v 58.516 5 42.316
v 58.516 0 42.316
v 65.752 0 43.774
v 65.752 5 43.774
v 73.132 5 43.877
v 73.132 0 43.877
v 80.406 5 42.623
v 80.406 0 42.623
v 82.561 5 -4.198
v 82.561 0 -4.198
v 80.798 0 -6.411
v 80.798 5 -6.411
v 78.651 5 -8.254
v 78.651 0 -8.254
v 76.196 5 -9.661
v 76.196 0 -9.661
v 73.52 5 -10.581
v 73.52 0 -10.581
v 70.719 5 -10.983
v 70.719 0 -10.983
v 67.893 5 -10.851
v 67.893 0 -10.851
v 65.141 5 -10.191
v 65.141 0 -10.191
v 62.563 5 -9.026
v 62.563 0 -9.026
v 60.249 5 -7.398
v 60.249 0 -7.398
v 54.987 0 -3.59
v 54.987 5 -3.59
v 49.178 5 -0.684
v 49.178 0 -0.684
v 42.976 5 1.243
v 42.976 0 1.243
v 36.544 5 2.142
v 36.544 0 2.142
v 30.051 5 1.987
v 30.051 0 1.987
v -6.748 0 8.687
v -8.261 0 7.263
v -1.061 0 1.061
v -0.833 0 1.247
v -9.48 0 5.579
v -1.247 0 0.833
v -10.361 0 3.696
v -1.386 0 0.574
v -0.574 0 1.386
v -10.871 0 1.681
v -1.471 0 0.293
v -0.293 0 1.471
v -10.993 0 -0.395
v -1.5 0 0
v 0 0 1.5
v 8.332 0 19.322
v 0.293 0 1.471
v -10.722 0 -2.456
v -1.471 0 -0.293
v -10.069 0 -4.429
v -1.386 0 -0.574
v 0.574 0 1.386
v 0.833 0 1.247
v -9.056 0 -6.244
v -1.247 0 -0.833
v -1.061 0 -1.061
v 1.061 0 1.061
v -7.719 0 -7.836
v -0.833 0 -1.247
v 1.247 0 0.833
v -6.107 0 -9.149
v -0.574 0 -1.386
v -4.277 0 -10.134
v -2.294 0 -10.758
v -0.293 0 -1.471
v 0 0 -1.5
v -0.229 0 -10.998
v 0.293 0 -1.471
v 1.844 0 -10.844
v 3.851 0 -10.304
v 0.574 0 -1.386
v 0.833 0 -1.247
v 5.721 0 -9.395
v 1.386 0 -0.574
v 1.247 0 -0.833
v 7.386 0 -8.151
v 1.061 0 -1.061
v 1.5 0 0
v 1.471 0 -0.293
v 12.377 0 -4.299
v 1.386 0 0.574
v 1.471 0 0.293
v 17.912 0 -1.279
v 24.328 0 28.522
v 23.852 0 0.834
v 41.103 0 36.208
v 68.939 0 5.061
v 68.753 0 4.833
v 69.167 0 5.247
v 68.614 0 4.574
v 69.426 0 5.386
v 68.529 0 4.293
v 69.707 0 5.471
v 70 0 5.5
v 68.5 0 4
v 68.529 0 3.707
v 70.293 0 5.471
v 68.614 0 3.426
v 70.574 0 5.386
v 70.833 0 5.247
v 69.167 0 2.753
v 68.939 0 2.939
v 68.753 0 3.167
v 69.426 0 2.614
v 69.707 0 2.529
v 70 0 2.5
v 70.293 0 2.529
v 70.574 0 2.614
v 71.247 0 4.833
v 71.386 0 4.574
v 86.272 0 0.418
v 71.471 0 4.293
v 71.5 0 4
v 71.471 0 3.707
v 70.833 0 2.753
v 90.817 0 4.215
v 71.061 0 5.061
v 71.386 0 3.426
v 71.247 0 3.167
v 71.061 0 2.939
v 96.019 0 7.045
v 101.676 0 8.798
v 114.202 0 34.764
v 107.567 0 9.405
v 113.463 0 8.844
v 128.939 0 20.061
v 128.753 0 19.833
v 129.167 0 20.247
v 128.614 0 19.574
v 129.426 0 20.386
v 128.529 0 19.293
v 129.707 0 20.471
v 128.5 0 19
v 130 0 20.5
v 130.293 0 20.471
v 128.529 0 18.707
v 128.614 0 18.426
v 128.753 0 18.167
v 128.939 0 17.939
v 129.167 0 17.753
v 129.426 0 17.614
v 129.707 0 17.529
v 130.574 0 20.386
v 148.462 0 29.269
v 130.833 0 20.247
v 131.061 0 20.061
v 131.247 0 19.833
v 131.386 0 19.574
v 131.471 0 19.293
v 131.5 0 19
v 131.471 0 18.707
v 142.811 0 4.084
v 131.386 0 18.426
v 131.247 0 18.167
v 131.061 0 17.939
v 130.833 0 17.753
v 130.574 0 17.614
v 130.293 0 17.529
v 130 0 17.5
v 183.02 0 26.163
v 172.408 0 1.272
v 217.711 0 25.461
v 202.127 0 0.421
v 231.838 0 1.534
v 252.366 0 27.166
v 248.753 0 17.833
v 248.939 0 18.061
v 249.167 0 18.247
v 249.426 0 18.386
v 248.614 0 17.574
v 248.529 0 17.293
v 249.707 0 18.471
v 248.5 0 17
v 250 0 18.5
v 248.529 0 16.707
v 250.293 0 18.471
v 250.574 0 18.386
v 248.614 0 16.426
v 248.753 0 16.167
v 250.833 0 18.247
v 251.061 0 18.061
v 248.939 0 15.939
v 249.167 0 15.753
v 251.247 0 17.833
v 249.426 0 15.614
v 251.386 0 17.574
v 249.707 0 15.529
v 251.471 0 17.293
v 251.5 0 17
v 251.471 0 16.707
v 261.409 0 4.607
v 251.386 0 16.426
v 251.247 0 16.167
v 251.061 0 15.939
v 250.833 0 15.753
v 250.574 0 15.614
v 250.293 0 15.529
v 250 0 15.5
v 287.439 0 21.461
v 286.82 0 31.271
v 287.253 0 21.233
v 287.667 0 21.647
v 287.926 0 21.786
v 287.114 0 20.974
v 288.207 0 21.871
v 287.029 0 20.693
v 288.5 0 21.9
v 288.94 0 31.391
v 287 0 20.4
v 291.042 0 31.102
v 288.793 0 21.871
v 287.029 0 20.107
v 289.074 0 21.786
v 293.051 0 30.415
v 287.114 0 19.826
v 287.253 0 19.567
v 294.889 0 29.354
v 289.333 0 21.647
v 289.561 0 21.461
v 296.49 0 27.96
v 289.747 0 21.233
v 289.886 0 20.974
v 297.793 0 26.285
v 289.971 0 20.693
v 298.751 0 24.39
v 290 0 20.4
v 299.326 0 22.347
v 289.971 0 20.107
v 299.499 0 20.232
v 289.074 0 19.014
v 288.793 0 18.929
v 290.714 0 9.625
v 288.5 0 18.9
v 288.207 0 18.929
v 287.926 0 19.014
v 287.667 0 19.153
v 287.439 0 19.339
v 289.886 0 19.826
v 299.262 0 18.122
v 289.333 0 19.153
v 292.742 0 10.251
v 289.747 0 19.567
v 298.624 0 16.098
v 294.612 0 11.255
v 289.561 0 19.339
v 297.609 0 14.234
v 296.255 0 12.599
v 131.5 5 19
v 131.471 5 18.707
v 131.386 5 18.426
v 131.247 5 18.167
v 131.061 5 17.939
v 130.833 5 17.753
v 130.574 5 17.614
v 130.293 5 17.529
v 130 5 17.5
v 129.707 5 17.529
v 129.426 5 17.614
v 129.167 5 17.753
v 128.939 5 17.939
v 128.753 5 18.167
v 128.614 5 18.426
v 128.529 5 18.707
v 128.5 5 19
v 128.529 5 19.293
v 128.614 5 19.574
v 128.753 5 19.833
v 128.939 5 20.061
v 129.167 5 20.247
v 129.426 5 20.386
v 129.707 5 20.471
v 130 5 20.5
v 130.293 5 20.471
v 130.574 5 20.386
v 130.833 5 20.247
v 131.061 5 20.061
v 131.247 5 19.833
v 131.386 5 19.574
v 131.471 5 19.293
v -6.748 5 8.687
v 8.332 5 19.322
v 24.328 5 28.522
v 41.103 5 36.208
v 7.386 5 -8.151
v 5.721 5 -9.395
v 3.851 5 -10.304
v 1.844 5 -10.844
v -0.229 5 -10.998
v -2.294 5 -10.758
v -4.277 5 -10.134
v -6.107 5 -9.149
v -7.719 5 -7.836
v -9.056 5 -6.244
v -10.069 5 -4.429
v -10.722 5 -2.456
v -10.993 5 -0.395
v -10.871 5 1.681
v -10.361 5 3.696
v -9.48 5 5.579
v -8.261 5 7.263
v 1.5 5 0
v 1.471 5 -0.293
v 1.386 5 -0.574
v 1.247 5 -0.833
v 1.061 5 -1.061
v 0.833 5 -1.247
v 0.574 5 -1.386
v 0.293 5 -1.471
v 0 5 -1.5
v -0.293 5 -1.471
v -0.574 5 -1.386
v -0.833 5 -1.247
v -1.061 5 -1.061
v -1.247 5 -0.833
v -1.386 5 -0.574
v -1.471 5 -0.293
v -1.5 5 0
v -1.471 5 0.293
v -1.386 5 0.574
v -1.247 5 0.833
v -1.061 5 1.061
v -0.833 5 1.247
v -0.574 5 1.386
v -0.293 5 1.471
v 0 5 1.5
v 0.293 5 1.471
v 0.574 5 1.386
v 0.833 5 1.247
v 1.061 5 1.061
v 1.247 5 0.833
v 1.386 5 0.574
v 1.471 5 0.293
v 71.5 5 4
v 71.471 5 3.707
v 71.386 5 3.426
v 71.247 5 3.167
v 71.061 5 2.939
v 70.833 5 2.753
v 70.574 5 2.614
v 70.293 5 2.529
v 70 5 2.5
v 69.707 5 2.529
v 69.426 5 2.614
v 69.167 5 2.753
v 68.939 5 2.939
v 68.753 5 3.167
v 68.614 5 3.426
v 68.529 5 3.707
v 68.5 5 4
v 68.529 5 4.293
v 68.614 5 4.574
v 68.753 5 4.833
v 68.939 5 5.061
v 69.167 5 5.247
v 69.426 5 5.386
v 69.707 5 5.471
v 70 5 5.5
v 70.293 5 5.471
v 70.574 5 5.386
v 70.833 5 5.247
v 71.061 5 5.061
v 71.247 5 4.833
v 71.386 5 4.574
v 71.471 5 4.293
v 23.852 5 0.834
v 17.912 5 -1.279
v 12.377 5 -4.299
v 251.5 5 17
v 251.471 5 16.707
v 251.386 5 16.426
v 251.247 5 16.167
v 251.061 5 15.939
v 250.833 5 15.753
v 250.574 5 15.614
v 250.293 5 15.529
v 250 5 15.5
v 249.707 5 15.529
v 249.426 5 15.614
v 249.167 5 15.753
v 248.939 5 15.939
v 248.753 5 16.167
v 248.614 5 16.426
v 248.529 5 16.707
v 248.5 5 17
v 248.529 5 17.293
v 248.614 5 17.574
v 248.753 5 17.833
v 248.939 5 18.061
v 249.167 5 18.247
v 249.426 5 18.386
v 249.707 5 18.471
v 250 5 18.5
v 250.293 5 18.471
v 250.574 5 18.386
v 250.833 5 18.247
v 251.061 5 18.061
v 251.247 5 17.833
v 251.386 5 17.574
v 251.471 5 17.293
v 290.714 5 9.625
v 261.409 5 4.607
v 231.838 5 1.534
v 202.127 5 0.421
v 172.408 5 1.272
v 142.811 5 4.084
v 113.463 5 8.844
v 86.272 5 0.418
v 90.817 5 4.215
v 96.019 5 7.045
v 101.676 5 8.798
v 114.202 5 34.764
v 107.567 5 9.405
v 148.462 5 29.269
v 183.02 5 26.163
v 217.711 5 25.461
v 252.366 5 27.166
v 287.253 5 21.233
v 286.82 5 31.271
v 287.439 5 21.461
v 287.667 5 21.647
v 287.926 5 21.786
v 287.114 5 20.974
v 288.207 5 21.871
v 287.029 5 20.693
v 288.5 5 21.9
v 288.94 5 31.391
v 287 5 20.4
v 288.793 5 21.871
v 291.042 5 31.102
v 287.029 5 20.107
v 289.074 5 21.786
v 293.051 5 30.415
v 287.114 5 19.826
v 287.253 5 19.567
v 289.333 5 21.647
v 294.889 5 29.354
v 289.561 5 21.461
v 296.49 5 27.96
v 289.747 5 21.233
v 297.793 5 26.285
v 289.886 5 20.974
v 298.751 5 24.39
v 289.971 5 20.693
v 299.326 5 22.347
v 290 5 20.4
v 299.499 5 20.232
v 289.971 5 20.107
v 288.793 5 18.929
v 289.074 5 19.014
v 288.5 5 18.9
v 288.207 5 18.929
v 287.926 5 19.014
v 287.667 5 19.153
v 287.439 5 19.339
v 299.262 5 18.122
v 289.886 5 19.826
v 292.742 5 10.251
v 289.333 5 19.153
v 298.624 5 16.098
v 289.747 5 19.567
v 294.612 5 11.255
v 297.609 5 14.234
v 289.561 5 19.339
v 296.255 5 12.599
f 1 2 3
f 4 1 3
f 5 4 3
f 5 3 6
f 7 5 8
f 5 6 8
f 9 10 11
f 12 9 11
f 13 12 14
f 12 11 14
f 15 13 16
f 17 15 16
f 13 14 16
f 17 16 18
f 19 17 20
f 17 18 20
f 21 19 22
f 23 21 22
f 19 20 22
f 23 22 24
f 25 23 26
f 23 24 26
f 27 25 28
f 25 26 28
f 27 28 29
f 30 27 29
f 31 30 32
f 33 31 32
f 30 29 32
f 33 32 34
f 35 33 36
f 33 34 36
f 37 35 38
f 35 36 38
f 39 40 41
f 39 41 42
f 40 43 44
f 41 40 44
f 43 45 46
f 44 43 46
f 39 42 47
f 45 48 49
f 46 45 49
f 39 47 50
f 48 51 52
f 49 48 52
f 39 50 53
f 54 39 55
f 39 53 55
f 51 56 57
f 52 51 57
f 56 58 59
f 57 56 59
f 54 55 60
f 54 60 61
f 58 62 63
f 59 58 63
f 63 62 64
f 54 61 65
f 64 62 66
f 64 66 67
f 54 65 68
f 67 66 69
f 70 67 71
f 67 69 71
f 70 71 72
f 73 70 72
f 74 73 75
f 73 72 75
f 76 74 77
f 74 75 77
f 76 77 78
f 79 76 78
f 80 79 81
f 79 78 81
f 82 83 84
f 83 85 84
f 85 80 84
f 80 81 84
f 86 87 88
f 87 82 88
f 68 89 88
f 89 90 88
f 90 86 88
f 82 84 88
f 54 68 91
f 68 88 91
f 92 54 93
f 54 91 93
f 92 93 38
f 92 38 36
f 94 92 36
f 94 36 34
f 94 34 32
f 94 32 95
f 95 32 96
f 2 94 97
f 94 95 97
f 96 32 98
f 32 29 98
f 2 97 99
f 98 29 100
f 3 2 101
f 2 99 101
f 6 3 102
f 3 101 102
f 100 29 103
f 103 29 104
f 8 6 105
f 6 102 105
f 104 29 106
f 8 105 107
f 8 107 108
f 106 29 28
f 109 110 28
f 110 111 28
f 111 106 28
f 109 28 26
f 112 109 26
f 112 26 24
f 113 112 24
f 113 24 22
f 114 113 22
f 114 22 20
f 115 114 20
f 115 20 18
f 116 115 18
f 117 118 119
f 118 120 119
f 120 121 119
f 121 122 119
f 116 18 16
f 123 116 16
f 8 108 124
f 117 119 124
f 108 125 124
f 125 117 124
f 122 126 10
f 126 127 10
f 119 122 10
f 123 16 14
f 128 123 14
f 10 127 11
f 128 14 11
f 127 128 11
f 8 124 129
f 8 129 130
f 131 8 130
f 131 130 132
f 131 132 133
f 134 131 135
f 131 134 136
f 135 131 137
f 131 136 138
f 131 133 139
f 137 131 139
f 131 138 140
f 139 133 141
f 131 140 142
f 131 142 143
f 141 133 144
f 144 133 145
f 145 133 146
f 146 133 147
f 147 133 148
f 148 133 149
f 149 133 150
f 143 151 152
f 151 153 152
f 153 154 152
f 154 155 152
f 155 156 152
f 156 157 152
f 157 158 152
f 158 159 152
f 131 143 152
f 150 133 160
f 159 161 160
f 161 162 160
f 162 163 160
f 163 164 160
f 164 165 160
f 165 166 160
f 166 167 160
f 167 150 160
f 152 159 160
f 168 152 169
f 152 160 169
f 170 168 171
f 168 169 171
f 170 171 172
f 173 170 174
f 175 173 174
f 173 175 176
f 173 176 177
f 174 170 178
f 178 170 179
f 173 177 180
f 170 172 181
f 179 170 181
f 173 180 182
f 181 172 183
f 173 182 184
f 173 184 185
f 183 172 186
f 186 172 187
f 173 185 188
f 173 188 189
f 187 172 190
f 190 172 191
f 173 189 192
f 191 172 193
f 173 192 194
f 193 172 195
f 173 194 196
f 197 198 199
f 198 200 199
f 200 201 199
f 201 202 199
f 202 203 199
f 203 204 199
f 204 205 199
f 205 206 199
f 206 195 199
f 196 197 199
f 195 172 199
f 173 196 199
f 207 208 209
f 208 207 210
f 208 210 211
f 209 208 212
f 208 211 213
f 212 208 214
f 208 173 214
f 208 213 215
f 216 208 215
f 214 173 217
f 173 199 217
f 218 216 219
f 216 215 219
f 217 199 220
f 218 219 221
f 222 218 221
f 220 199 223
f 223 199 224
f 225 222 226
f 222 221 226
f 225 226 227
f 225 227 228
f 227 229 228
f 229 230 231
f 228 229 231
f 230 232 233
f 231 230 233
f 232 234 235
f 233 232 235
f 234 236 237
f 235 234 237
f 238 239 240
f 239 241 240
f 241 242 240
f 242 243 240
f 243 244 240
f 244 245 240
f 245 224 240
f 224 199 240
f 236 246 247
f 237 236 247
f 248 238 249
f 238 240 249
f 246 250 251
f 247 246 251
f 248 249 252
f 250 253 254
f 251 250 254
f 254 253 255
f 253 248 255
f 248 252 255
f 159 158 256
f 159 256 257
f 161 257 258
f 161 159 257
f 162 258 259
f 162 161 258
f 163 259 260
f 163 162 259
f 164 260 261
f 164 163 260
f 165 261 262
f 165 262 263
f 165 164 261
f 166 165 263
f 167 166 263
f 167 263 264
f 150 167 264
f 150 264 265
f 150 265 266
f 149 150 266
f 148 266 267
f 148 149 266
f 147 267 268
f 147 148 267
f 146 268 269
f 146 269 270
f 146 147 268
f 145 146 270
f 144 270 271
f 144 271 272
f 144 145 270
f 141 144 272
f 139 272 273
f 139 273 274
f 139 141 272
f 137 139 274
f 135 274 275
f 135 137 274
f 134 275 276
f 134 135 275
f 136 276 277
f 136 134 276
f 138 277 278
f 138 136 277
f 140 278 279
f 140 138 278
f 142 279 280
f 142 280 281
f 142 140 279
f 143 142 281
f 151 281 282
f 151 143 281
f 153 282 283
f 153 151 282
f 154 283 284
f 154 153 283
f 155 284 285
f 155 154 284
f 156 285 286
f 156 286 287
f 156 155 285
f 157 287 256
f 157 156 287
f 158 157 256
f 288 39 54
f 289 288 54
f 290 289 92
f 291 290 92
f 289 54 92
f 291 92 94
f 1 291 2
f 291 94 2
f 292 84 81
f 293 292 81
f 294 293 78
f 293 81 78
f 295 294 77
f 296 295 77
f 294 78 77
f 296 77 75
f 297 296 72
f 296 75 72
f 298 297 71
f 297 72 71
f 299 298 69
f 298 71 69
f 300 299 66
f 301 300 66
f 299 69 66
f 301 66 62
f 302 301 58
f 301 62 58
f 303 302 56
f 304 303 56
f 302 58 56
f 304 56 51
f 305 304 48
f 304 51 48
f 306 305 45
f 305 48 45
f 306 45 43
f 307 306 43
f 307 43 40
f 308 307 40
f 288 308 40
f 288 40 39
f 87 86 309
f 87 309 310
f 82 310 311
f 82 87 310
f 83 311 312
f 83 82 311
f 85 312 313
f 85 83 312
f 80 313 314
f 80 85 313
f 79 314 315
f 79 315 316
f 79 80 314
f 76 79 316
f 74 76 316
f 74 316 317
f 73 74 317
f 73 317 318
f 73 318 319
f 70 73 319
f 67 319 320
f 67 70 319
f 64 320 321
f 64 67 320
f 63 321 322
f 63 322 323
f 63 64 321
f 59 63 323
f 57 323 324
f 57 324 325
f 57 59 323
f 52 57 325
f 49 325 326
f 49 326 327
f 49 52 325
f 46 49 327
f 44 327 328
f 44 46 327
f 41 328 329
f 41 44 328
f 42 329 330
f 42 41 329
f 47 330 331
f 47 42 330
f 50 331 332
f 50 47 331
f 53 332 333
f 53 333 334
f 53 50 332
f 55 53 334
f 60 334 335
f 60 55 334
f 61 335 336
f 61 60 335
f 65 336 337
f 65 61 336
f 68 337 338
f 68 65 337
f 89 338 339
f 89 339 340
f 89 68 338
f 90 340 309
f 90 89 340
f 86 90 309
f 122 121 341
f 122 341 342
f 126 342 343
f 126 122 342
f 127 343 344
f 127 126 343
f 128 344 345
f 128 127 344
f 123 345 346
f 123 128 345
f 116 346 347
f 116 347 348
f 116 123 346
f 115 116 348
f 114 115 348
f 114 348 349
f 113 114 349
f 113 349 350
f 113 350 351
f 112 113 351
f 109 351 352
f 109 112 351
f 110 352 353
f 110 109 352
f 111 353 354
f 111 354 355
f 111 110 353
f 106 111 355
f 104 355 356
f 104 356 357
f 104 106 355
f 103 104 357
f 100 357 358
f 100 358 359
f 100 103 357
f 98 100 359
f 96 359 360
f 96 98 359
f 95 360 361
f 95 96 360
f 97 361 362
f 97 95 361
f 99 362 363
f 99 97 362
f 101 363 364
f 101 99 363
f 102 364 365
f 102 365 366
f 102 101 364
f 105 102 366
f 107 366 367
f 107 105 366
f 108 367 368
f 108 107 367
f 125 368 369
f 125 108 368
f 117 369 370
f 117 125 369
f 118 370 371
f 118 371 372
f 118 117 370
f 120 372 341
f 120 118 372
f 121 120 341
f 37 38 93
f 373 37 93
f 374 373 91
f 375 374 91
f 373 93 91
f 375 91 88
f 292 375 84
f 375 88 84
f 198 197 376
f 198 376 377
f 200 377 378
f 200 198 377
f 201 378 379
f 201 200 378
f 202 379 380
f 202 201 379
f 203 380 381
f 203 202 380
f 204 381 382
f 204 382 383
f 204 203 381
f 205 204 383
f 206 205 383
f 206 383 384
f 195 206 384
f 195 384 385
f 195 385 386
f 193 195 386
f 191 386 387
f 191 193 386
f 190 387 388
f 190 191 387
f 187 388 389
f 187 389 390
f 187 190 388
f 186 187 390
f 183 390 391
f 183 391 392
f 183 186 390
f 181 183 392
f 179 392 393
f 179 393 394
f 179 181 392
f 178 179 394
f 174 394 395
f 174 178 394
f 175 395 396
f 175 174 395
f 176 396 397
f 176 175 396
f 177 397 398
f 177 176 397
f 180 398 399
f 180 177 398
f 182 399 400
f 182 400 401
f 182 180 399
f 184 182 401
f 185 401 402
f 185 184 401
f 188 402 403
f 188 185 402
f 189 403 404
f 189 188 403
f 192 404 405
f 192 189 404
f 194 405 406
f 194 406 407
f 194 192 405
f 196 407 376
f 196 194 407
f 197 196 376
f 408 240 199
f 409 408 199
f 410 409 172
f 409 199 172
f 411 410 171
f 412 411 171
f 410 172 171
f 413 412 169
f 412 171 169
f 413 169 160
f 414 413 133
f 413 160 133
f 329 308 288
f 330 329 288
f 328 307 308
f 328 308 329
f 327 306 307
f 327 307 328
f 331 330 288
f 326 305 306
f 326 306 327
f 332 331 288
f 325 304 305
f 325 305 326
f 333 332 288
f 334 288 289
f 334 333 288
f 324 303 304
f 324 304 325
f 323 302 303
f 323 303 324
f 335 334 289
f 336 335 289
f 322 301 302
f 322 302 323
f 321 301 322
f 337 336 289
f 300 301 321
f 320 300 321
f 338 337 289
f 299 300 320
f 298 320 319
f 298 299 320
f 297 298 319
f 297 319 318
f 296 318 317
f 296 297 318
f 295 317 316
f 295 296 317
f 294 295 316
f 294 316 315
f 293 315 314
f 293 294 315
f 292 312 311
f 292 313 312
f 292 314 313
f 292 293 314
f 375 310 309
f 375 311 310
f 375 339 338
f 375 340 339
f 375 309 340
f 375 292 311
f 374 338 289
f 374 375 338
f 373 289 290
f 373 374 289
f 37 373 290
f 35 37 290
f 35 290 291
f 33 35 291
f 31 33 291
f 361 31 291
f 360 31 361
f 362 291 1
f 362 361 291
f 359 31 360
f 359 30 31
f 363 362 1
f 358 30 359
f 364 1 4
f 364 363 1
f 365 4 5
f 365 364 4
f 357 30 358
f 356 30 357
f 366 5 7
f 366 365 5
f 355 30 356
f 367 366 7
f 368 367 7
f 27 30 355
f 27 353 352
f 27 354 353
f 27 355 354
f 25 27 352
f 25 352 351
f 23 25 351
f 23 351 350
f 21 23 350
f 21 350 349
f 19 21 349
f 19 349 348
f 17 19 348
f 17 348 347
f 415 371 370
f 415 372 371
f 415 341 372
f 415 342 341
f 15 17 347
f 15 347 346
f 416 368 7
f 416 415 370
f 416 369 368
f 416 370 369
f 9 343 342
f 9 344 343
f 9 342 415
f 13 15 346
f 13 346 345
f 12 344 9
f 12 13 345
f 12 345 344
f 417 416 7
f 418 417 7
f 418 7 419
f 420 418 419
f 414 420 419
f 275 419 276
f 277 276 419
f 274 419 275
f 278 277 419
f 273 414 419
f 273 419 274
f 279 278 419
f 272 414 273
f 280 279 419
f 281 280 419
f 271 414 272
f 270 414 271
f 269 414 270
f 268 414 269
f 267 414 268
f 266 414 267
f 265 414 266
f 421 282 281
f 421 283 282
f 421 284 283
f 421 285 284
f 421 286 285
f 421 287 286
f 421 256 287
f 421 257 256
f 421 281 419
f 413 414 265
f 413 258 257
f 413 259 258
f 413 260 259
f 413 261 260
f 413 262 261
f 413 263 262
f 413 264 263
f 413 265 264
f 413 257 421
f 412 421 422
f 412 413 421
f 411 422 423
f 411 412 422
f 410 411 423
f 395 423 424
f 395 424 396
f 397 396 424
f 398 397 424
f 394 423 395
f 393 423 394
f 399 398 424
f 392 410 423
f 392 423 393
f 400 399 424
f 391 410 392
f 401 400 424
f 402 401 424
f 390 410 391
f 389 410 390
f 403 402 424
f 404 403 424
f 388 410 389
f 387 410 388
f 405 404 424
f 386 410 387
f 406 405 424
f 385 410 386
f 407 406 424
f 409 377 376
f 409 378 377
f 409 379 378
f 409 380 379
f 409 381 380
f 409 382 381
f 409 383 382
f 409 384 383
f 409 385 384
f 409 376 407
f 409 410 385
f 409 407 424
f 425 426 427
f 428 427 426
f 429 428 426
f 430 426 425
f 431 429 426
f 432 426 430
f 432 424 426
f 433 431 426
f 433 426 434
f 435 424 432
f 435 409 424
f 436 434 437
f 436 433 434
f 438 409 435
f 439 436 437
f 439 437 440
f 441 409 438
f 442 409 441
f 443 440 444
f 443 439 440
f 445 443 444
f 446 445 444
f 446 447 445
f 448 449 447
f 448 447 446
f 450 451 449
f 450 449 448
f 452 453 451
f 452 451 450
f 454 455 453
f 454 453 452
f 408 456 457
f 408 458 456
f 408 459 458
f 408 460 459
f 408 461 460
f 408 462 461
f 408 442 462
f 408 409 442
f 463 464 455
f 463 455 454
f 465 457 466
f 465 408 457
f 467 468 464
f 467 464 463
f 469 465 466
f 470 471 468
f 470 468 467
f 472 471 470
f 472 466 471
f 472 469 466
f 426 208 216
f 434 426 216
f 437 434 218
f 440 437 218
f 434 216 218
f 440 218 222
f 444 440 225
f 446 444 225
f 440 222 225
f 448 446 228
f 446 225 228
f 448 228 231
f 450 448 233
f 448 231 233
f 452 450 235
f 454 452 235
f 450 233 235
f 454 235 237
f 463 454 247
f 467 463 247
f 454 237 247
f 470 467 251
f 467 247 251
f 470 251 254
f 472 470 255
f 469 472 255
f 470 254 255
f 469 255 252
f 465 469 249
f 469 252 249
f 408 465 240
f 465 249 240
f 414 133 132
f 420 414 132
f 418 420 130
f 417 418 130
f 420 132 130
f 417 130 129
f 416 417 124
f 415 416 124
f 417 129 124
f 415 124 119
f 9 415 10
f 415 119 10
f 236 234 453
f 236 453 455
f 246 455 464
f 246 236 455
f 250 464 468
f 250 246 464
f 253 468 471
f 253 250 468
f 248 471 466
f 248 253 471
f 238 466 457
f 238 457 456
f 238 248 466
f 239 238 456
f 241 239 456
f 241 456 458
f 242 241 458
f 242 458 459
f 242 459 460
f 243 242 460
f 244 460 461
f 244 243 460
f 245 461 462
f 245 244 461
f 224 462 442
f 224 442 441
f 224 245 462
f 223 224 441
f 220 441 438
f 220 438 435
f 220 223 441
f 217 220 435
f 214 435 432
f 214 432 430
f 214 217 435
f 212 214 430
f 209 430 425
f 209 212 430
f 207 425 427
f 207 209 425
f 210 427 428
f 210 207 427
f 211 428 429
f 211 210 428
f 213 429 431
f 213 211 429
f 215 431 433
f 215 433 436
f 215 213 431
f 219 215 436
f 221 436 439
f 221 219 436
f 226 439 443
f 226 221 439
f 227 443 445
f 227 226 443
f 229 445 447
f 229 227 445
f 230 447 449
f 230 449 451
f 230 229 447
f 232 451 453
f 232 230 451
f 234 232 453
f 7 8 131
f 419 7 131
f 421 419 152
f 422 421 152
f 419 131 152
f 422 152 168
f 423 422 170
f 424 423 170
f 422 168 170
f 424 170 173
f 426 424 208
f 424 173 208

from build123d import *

# Parameters (mm, degrees)
SKETCH1_R           = 1.5
BOSS_EXTRUDE1_DEPTH = 5


with BuildPart() as part:
    # Sketch1 → Boss-Extrude1 (new body)
    with BuildSketch(Plane(origin=(0, 0, 0), x_dir=(1, 0, 0), z_dir=(0, 1, 0))):
        with BuildLine():
            ThreePointArc((30.05067828, -1.98711795), (17.911907525, 1.279041193), (7.386236134, 8.151289209))
            ThreePointArc((7.386236134, 8.151289209), (-8.425357061, 7.07201233), (-6.747627634, -8.68731957))
            ThreePointArc((-6.747627634, -8.68731957), (24.327807705, -28.522008688), (58.515872209, -42.315986336))
            ThreePointArc((58.515872209, -42.315986336), (69.43935161, -43.996070724), (80.405631289, -42.622827932))
            ThreePointArc((80.405631289, -42.622827932), (183.01994094, -26.16258262), (286.820423183, -31.271017511))
            ThreePointArc((286.820423183, -31.271017511), (299.326255976, -22.347352445), (290.71394184, -9.625100394))
            ThreePointArc((290.71394184, -9.625100394), (202.127360194, -0.420820539), (113.463070734, -8.843705436))
            ThreePointArc((113.463070734, -8.843705436), (96.019370903, -7.044766711), (82.561456398, 4.198159132))
            ThreePointArc((82.561456398, 4.198159132), (72.12928734, 10.848102082), (60.248711806, 7.397911149))
            ThreePointArc((60.248711806, 7.397911149), (46.116503766, -0.405485841), (30.05067828, -1.98711795))
        make_face()
        with Locations((130, -19)):
            Circle(SKETCH1_R, mode=Mode.SUBTRACT)
        with Locations((250, -17)):
            Circle(SKETCH1_R, mode=Mode.SUBTRACT)
        with Locations((288.5, -20.4)):
            Circle(SKETCH1_R, mode=Mode.SUBTRACT)
        with Locations((70, -4)):
            Circle(SKETCH1_R, mode=Mode.SUBTRACT)
        Circle(SKETCH1_R, mode=Mode.SUBTRACT)
    extrude(amount=BOSS_EXTRUDE1_DEPTH)


solid = part.part
